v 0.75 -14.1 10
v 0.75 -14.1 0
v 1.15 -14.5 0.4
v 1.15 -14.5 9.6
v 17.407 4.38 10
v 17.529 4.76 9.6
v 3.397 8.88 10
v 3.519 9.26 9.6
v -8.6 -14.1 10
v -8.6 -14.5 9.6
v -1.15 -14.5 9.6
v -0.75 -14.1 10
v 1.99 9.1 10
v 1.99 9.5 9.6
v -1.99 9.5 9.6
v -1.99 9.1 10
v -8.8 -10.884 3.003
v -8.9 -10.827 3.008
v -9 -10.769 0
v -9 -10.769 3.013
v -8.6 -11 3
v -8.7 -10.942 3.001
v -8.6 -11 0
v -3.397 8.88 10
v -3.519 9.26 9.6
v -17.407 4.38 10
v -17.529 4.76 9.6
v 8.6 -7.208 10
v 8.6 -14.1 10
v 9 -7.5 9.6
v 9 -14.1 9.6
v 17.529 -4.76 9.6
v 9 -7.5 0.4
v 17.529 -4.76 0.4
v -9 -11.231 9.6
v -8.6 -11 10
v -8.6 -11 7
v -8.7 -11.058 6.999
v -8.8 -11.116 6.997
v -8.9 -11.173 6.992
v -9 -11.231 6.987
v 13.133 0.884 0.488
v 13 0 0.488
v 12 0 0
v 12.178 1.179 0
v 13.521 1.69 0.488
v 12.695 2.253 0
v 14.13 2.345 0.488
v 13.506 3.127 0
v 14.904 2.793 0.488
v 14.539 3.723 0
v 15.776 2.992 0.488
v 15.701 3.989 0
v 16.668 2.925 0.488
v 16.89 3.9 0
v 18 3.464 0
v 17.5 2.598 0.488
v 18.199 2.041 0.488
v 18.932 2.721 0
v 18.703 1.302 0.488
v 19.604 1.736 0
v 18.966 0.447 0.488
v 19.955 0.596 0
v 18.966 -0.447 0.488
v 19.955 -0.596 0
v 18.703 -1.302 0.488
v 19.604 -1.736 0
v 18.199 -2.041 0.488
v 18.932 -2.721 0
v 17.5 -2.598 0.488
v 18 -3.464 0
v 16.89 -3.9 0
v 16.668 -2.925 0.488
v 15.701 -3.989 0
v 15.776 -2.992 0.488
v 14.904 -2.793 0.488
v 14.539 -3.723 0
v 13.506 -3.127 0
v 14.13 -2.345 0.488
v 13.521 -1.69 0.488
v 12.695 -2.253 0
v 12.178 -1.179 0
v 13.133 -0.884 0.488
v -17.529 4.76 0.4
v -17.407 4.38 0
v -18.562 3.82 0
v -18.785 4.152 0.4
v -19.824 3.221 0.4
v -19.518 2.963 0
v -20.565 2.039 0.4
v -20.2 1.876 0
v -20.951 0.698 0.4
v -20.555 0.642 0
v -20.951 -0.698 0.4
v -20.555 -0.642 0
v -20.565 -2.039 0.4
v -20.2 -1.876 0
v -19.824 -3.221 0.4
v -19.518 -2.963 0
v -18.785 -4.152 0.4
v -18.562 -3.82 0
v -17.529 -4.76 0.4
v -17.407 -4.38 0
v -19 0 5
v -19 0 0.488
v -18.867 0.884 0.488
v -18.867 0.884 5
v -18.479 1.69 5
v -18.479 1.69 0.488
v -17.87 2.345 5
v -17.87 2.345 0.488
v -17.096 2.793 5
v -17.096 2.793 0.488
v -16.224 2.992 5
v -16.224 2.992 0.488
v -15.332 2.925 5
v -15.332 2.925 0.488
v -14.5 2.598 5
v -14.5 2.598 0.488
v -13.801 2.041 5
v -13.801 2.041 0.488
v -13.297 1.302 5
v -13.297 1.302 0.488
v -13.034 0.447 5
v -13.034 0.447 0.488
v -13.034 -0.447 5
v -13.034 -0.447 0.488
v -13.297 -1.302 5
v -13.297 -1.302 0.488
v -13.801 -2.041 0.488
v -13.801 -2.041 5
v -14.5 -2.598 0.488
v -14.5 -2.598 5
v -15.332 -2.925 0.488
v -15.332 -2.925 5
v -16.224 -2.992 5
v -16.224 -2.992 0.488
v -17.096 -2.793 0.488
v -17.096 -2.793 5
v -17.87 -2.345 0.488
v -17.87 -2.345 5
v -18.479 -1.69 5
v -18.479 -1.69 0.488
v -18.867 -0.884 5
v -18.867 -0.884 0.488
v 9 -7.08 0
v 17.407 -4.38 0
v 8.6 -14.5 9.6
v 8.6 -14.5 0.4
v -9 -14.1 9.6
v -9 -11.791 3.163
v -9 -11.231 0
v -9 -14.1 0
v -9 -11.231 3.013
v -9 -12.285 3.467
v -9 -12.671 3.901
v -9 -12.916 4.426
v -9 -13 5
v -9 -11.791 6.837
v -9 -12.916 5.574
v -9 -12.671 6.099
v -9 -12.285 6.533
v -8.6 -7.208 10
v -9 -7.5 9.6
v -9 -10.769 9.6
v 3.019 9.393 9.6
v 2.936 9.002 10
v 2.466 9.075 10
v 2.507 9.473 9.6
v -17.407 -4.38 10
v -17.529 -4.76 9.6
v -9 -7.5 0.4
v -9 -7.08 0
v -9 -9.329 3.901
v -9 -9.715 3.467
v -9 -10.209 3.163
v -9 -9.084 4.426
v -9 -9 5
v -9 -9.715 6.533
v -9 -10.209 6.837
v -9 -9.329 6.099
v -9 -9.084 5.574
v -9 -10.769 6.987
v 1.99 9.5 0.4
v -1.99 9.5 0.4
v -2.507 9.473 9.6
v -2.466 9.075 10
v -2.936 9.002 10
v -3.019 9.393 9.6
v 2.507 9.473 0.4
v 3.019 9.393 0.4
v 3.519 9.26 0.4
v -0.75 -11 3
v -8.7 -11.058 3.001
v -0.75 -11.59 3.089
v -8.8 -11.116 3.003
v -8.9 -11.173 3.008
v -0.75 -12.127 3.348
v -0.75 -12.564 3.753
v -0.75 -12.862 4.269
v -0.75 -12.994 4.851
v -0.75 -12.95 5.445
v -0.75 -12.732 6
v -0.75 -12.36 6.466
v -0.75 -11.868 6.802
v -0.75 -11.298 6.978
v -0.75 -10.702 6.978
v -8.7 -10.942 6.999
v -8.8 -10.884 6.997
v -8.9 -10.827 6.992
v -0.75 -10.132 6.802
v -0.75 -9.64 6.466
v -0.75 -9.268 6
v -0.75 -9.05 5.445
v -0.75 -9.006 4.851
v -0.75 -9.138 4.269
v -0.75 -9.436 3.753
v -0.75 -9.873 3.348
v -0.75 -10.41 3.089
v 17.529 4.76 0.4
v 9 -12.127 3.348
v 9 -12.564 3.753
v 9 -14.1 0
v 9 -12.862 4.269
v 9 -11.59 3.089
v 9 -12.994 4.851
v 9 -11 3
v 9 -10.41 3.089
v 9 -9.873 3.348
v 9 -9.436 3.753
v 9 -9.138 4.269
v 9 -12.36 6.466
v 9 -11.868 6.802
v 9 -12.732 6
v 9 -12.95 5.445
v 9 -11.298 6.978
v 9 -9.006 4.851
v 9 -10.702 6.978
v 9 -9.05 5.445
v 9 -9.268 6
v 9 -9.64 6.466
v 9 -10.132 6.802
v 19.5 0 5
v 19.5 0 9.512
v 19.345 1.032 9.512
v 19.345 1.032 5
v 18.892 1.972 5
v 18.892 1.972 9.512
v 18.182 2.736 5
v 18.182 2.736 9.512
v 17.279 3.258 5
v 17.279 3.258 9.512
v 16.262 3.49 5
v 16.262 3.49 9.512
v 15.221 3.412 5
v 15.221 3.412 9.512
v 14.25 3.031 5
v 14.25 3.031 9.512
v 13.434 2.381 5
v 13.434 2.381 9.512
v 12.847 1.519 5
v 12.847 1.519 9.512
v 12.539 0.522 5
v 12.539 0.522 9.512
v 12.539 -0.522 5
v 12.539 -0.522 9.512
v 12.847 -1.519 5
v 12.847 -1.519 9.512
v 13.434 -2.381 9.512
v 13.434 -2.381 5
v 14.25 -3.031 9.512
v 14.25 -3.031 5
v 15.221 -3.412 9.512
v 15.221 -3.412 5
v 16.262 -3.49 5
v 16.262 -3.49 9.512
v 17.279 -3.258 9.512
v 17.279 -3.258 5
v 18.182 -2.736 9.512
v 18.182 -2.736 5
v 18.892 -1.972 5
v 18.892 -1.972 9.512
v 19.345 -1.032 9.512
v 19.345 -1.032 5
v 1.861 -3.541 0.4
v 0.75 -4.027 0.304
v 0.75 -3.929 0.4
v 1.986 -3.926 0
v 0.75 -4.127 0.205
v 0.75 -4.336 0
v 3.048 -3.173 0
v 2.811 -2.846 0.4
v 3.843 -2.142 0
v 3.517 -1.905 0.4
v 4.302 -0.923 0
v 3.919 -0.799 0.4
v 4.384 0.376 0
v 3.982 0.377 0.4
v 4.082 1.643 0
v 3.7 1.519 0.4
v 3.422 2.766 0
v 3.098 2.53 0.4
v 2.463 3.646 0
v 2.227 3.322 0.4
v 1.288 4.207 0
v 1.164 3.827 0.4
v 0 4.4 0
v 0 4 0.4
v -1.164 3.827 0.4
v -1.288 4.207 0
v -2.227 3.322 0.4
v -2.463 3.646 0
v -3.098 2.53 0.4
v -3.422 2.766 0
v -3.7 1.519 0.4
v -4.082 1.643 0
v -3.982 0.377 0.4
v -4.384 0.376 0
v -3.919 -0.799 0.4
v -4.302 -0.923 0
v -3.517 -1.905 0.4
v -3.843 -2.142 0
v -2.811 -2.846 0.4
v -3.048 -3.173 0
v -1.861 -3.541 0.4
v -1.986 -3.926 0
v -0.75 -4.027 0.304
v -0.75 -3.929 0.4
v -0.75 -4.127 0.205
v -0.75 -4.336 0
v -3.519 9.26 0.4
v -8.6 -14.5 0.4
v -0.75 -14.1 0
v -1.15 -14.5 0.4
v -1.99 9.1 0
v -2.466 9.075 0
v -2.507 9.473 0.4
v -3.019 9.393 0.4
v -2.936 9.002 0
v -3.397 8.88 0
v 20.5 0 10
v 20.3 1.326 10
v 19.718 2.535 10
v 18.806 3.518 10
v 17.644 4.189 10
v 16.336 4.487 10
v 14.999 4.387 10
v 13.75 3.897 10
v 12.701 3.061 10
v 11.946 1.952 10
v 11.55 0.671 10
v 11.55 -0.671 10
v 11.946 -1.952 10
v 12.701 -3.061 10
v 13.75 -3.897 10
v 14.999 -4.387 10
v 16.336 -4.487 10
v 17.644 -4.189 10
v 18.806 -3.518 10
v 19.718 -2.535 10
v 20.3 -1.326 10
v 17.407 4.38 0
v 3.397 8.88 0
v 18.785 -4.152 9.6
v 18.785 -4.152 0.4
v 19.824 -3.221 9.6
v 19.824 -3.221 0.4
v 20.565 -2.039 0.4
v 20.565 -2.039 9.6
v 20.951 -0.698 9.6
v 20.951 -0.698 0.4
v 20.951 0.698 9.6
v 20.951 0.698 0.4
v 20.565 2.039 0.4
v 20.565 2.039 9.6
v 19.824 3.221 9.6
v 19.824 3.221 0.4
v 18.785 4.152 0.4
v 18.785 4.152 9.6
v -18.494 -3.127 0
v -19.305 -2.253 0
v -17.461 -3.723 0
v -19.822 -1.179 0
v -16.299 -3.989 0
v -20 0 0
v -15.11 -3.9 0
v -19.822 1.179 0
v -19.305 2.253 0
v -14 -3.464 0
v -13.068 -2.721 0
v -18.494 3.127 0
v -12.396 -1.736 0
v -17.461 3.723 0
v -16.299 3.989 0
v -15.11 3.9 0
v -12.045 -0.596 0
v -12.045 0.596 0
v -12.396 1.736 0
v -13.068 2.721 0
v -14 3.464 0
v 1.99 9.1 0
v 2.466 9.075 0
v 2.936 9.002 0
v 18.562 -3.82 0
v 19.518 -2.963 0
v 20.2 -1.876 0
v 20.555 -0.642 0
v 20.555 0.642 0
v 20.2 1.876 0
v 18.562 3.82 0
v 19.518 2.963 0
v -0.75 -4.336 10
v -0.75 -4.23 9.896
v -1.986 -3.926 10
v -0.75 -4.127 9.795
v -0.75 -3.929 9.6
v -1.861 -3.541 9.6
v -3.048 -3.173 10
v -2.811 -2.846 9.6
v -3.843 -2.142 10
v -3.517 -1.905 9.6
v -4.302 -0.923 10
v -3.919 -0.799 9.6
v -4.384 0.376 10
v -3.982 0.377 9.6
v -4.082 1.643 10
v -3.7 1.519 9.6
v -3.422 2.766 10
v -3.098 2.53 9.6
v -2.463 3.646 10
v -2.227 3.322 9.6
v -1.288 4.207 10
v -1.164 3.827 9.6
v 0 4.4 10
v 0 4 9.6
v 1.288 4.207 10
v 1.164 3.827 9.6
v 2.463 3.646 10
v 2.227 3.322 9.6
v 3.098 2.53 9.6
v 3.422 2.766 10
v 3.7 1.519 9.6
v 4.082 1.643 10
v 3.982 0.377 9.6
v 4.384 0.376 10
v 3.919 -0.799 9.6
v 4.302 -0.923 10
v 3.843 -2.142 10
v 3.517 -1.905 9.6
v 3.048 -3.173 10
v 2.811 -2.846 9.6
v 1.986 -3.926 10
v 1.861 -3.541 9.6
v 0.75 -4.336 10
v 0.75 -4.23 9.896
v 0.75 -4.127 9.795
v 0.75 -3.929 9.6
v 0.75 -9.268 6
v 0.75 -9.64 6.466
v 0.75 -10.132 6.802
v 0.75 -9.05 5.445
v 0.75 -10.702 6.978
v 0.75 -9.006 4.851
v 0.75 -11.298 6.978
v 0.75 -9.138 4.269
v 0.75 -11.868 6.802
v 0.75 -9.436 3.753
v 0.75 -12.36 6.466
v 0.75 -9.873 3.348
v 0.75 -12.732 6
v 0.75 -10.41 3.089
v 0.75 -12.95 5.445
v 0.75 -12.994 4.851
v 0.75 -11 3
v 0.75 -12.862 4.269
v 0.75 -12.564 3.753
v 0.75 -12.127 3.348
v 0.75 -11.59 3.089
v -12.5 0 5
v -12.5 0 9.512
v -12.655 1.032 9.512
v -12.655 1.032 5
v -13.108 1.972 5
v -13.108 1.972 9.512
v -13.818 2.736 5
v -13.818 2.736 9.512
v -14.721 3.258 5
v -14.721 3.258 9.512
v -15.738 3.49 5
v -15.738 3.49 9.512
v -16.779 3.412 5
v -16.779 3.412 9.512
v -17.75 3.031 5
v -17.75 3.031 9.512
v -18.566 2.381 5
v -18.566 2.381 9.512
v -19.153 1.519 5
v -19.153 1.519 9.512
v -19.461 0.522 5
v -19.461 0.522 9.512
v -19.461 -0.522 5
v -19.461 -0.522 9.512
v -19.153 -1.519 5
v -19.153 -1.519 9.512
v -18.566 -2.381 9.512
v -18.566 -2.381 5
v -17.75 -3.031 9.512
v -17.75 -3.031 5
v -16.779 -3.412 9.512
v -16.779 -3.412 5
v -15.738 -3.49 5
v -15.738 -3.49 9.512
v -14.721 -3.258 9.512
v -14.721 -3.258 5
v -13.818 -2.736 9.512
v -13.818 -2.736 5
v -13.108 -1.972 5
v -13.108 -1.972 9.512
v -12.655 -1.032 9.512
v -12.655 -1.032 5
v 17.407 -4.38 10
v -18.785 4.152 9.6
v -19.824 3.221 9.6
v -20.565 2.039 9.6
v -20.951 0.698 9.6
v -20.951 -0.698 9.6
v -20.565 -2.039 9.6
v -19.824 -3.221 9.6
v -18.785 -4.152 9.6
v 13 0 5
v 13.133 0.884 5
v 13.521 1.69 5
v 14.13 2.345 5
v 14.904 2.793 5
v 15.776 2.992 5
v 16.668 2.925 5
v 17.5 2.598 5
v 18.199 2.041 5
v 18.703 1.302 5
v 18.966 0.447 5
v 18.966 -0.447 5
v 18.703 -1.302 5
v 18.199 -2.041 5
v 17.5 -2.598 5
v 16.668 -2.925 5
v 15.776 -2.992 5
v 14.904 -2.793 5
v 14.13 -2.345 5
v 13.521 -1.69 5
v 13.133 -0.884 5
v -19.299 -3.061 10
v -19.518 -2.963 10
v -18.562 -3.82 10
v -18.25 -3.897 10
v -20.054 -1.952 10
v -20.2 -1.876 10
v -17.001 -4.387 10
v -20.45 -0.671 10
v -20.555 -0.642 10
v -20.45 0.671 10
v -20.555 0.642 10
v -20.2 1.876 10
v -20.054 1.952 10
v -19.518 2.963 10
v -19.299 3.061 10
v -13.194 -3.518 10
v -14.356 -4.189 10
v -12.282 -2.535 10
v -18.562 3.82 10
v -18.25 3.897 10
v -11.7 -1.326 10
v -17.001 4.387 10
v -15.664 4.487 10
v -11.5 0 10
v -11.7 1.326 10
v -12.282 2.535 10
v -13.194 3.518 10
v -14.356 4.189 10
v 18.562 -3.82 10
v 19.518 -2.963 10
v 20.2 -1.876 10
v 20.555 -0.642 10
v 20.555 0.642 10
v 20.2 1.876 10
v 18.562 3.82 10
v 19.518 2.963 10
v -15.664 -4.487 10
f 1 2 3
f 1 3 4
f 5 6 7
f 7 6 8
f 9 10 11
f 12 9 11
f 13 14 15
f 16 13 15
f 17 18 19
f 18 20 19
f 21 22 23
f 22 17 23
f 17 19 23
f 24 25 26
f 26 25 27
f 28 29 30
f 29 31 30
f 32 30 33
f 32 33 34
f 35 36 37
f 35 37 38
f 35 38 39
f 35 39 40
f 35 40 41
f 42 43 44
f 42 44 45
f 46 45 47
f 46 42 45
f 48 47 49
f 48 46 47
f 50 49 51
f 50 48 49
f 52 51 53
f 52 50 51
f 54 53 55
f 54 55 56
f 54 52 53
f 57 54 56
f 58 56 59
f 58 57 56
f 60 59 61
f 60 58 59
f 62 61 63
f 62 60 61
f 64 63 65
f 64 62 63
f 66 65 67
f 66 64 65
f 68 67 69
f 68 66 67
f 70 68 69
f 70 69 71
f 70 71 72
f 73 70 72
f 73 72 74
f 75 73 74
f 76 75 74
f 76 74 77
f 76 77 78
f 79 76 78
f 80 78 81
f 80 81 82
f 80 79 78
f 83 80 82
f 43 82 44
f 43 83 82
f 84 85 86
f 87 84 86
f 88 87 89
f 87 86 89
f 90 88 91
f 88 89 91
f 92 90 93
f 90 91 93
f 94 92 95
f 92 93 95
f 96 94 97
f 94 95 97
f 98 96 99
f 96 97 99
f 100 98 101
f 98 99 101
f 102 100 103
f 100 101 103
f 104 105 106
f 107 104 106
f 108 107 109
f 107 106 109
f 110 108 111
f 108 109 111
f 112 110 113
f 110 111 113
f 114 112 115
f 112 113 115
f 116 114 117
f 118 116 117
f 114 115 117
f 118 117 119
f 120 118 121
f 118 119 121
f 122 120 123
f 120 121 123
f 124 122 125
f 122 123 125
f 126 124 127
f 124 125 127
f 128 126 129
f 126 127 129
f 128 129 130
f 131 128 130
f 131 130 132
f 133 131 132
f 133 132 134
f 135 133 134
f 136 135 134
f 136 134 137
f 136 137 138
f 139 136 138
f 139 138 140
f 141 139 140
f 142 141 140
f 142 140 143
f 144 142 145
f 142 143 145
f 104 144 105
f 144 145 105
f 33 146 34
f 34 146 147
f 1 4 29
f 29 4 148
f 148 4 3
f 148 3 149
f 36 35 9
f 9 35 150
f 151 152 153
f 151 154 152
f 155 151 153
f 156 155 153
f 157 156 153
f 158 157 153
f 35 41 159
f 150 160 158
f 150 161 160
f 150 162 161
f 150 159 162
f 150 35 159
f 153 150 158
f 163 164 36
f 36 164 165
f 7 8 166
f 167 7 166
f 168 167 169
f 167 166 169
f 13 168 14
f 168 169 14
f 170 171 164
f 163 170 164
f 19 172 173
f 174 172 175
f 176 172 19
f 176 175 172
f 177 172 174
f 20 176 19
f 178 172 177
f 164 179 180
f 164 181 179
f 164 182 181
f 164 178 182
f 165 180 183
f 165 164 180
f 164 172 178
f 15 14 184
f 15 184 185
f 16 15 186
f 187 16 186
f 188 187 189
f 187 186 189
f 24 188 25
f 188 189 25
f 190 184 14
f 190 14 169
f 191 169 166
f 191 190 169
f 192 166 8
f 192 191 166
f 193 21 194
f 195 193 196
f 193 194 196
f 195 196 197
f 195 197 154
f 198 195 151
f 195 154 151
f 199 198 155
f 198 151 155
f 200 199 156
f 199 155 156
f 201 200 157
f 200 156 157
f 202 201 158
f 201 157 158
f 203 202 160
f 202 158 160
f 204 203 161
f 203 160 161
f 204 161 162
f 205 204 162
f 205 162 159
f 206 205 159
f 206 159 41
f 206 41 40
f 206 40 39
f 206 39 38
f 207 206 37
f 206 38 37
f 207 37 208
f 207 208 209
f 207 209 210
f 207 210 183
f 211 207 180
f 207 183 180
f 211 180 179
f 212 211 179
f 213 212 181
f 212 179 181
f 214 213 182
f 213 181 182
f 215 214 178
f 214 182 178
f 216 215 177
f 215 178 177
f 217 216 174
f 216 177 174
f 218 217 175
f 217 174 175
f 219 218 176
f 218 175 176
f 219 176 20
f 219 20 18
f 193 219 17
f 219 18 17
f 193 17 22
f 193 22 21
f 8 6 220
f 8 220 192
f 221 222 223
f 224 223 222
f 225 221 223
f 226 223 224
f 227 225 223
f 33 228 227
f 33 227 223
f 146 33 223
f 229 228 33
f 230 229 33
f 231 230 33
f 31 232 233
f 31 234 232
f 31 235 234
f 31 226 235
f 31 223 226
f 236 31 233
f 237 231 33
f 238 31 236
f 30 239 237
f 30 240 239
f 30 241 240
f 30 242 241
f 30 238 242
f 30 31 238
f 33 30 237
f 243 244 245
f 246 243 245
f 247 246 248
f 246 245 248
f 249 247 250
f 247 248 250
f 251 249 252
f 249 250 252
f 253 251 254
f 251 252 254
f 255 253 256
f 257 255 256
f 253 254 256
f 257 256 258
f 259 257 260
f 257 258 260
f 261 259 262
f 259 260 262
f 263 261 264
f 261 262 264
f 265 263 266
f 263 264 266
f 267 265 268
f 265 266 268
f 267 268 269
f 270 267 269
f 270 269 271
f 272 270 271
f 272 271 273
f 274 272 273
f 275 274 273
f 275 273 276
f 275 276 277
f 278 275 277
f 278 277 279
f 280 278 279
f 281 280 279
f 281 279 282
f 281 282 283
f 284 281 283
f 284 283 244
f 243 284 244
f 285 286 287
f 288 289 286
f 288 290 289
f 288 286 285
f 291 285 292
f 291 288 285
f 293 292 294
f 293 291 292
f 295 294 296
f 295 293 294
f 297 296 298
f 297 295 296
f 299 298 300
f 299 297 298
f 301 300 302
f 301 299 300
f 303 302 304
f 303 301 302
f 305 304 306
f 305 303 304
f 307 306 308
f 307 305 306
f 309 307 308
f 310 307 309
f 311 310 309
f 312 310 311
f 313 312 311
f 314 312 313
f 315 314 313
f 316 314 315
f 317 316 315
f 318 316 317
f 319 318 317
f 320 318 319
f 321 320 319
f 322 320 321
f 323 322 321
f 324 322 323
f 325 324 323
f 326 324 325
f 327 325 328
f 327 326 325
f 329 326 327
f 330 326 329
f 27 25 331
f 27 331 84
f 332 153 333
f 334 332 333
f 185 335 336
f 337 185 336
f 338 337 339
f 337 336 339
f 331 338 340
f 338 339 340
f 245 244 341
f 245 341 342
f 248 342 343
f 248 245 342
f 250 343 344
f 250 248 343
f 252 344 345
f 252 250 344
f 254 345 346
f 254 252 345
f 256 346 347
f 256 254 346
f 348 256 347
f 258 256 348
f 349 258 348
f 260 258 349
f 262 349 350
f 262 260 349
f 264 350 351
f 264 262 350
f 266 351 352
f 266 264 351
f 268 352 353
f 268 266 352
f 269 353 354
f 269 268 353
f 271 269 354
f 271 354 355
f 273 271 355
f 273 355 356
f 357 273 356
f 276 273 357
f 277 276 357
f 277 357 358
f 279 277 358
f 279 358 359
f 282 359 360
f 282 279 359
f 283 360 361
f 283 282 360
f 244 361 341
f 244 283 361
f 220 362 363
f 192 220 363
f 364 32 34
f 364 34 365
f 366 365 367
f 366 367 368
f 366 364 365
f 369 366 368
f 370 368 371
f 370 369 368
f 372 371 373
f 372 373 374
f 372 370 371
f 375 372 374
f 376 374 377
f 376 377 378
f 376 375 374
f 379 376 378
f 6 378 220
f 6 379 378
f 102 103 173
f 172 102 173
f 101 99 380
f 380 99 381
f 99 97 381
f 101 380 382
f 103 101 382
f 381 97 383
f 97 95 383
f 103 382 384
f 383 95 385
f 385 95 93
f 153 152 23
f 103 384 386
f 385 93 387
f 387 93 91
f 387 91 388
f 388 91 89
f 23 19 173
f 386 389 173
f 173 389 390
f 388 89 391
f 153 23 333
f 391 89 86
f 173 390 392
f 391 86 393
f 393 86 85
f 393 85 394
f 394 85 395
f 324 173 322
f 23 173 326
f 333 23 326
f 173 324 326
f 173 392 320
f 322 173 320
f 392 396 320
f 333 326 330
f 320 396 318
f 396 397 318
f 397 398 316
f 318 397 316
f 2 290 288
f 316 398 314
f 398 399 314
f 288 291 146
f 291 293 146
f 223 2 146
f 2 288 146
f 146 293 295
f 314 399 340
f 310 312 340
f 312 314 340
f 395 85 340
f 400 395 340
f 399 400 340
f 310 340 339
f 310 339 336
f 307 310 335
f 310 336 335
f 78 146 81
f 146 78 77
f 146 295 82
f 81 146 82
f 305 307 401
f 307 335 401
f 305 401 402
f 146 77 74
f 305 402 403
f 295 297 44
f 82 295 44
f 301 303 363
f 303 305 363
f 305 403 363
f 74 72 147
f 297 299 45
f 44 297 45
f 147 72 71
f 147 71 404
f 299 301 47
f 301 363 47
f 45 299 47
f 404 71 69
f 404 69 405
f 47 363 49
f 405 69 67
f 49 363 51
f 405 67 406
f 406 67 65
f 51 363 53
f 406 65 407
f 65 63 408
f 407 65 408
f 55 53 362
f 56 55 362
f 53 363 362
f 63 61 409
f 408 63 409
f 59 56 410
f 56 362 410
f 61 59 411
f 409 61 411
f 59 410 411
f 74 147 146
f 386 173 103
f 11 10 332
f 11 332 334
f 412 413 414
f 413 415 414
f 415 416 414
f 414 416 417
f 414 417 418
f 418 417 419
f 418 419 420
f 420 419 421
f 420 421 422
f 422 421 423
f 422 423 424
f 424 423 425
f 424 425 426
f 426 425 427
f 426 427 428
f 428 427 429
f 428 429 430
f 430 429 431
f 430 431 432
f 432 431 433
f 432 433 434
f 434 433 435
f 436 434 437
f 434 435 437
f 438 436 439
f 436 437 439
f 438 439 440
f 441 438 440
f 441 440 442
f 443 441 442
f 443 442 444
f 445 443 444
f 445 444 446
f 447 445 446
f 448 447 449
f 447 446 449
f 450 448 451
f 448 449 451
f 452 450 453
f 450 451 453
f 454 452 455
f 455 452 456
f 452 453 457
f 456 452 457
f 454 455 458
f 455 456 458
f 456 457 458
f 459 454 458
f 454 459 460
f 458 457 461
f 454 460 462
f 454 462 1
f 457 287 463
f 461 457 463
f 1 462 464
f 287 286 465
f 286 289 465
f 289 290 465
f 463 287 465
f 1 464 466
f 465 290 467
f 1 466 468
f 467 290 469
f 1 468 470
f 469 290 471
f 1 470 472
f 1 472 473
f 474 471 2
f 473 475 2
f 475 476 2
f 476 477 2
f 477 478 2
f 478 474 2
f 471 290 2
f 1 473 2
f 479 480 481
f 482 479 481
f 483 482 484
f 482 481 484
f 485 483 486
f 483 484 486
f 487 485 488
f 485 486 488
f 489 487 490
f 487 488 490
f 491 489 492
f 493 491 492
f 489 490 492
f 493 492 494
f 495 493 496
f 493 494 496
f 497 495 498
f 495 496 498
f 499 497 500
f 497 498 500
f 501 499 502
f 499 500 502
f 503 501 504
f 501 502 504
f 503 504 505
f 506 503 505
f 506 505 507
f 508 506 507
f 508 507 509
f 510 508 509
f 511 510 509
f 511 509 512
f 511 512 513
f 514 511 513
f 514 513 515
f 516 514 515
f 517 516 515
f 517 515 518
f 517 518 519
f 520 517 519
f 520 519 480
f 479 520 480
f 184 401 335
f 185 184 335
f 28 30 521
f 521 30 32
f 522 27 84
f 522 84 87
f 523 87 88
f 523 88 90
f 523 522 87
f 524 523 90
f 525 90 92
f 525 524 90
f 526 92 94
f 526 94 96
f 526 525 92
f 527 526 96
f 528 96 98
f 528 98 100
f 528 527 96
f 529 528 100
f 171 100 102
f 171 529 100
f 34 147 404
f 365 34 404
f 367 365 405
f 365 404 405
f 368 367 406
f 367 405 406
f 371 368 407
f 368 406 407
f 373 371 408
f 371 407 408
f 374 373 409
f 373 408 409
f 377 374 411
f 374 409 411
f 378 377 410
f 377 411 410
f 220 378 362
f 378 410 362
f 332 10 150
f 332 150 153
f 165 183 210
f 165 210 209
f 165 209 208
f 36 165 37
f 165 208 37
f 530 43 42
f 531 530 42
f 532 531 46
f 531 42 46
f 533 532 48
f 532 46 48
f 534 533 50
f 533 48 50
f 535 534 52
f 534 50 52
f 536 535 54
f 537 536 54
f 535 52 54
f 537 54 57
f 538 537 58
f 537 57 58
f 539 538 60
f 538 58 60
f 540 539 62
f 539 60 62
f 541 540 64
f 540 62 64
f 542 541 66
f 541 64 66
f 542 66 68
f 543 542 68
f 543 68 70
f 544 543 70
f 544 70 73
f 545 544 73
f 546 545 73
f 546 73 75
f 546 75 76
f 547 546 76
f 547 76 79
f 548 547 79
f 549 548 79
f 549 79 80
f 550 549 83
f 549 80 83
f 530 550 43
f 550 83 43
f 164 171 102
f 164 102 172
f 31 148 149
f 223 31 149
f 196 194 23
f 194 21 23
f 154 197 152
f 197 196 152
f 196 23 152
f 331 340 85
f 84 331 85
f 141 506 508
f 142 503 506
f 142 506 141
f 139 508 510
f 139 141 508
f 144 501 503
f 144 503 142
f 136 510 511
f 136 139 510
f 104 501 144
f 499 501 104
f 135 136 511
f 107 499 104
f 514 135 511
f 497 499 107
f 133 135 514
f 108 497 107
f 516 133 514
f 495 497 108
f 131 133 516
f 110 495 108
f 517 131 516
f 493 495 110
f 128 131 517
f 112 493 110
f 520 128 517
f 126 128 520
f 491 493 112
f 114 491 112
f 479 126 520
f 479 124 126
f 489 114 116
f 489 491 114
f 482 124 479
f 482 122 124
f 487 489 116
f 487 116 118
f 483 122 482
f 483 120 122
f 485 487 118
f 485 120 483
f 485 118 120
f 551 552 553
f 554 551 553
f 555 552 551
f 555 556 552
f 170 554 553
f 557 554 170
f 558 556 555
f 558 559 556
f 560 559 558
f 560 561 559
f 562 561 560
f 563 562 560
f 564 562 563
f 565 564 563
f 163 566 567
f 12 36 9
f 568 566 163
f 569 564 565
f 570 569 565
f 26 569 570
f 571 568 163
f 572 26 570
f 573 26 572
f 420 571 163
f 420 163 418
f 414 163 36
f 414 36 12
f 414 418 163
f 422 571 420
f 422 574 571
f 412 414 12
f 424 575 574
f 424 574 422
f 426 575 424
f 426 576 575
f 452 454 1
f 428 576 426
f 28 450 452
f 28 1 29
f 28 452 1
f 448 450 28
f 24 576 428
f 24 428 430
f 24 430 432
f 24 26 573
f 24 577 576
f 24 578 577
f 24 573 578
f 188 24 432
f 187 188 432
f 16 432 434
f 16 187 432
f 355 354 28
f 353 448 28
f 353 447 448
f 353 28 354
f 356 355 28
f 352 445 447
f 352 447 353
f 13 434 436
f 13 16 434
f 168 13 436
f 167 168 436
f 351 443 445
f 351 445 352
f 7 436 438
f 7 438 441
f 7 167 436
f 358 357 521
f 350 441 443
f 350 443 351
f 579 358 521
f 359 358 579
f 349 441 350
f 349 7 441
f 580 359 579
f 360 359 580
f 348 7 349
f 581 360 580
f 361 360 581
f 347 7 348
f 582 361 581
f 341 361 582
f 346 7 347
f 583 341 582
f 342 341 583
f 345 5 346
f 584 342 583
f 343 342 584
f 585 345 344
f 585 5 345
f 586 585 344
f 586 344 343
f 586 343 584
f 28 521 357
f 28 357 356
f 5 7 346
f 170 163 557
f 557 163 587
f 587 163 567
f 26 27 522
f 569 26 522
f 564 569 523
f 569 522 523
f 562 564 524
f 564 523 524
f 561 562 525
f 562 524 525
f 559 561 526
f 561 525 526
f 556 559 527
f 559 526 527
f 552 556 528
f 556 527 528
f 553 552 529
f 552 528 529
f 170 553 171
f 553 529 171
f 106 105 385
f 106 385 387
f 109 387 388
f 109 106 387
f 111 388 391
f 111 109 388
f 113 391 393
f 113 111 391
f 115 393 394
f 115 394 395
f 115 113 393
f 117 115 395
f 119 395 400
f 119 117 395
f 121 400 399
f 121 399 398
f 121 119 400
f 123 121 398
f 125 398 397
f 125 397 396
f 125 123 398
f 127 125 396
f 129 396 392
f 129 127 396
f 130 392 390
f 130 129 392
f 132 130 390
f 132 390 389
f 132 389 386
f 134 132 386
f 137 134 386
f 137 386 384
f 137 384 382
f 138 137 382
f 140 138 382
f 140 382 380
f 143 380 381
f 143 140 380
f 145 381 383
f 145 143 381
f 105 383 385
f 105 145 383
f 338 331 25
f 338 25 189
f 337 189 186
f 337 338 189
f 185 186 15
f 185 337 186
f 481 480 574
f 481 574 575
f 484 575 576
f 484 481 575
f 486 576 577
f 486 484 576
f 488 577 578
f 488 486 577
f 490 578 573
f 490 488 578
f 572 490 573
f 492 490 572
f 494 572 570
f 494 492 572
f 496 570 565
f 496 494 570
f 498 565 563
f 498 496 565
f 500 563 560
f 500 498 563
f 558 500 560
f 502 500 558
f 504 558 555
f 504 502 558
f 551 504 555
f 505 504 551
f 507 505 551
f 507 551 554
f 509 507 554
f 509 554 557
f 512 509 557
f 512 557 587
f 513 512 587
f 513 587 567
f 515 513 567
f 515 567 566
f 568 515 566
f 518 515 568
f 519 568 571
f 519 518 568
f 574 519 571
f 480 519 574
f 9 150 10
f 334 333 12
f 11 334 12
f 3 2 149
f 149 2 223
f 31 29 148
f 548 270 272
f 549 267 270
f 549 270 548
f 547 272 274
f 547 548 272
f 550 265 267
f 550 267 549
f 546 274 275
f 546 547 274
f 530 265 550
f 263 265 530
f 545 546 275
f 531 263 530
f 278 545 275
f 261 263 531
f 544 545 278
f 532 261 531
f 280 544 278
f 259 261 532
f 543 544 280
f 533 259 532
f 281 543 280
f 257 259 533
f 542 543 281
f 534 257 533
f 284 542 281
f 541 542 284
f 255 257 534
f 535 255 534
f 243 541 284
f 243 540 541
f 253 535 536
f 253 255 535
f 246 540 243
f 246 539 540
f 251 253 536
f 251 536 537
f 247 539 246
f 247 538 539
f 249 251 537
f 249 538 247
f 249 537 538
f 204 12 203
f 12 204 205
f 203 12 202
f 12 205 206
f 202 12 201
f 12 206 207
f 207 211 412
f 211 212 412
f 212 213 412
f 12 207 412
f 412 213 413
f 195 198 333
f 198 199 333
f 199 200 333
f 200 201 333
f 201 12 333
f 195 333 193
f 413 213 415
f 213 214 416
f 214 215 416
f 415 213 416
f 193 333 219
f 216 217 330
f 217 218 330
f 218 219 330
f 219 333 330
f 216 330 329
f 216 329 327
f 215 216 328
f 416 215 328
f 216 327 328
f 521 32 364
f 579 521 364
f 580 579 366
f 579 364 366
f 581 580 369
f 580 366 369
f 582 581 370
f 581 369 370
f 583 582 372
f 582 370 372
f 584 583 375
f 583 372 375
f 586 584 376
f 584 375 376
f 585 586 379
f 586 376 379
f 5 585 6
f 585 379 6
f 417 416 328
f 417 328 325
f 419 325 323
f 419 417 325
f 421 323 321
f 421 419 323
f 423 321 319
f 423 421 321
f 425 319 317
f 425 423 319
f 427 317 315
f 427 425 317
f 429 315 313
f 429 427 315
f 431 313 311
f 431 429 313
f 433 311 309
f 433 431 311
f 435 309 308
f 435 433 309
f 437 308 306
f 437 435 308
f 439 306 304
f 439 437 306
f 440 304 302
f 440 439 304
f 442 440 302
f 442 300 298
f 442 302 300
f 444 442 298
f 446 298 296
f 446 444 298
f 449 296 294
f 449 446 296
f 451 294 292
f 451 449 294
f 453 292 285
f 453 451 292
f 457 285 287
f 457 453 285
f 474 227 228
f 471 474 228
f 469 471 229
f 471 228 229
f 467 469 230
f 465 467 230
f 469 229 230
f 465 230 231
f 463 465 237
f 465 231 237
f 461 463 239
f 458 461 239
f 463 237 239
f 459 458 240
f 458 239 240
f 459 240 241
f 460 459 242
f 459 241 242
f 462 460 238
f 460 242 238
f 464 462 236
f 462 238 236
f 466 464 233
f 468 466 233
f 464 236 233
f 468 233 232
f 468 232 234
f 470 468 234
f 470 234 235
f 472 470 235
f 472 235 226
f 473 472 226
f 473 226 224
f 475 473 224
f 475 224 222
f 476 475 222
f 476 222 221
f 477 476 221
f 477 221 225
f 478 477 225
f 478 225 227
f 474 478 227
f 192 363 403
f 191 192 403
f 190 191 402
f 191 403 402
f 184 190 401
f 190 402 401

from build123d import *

# Parameters (mm, degrees)
BOSS_EXTRUDE1_DEPTH             = 10
CUT_EXTRUDE1_DEPTH              = 28.408940147
CUT_EXTRUDE2_DEPTH              = 28.408940147
SKETCH4_W                       = 4
SKETCH4_H                       = 10
SKETCH5_W                       = 2
SKETCH5_H                       = 20.25
F_4_0_4_DIAMETER_HOLE2_D        = 4
F_4_0_4_DIAMETER_HOLE2_DEPTH    = 20.25
M7X1_0_TAPPED_HOLE1_D           = 6
M7X1_0_TAPPED_HOLE1_CBORE_D     = 7
M7X1_0_TAPPED_HOLE1_CBORE_DEPTH = 5
FILLET1_R                       = 5
CHAMFER1_SIZE                   = 1
CHAMFER1_SIZE2                  = 0.487732589
CHAMFER2_SIZE                   = 0.4
CHAMFER3_SIZE                   = 1
CHAMFER3_SIZE2                  = 0.487732589


with BuildPart() as part:
    # Sketch1 → Boss-Extrude1 (new body)
    with BuildSketch(Plane.XY.offset(10)):
        with BuildLine():
            Line((-9, -7.5), (-9, -14.5))
            Line((-9, -14.5), (9, -14.5))
            Line((9, -14.5), (9, -7.5))
            Line((9, -7.5), (17.529062862, -4.760458672))
            ThreePointArc((17.529062862, -4.760458672), (21, 0), (17.529062862, 4.760458672))
            Line((17.529062862, 4.760458672), (2.773364341, 9.5))
            Line((2.773364341, 9.5), (-2.773364341, 9.5))
            Line((-2.773364341, 9.5), (-17.529062862, 4.760458672))
            ThreePointArc((-17.529062862, 4.760458672), (-21, 0), (-17.529062862, -4.760458672))
            Line((-17.529062862, -4.760458672), (-9, -7.5))
        make_face()
    extrude(amount=-BOSS_EXTRUDE1_DEPTH)

    # Sketch2 → Cut-Extrude1 (cut, through all)
    with BuildSketch(Plane(origin=(0, 0, 0), x_dir=(-1, 0, 0), z_dir=(0, 0, -1))):
        Polygon((9, -11.230940108), (9, -10.769059892), (8.6, -11), align=None)
    extrude(amount=-CUT_EXTRUDE1_DEPTH, mode=Mode.SUBTRACT)

    # Sketch3 → Cut-Extrude2 (cut, through all)
    with BuildSketch(Plane(origin=(0, 0, 0), x_dir=(-1, 0, 0), z_dir=(0, 0, -1))):
        with BuildLine():
            Line((0.75, -14.5), (0.75, -3.929058411))
            ThreePointArc((0.75, -3.929058411), (0, -4), (-0.75, -3.929058411))
            Line((-0.75, -3.929058411), (-0.75, -14.5))
            Line((-0.75, -14.5), (0.75, -14.5))
        make_face()
    extrude(amount=-CUT_EXTRUDE2_DEPTH, mode=Mode.SUBTRACT)

    # Sketch4 → Cut-Revolve1 (revolve, cut)
    with BuildSketch(Plane.XZ):
        with Locations((2, 5)):
            Rectangle(SKETCH4_W, SKETCH4_H)
    revolve(axis=Axis((0, 0, 10), (0, 0, -1)), mode=Mode.SUBTRACT)

    # Sketch5 → Ø4.0 (4) Diameter Hole1 (revolve, cut)
    with BuildSketch(Plane(origin=(-0.75, -11, 5), x_dir=(0, 0, -1), z_dir=(0, 1, 0))):
        with Locations((1, 10.125)):
            Rectangle(SKETCH5_W, SKETCH5_H)
    revolve(axis=Axis((5.6, -11, 5), (-1, 0, 0)), mode=Mode.SUBTRACT)

    # Ø4.0 (4) Diameter Hole2
    with Locations(Plane.ZY.offset(-0.75)):
        with Locations((5, -11)):
            Hole(F_4_0_4_DIAMETER_HOLE2_D / 2, depth=F_4_0_4_DIAMETER_HOLE2_DEPTH)

    # M7x1.0 Tapped Hole1 (through all)
    with Locations(Plane.XY.offset(10)):
        with Locations((-16, 0), (16, 0)):
            CounterBoreHole(M7X1_0_TAPPED_HOLE1_D / 2, M7X1_0_TAPPED_HOLE1_CBORE_D / 2, M7X1_0_TAPPED_HOLE1_CBORE_DEPTH)

    # Fillet1
    fillet1_edges = [part.edges().sort_by_distance(p)[0] for p in [
        (-2.773364341, 9.5, 5),
        (2.773364341, 9.5, 5),
    ]]
    fillet(fillet1_edges, radius=FILLET1_R)

    # Chamfer1
    chamfer1_edges = [part.edges().sort_by_distance(p)[0] for p in [
        (12.5, 0, 10),
        (-19.5, 0, 10),
    ]]
    chamfer1_side = [part.faces().sort_by_distance(p)[0] for p in [
        (0, 9.016264535, 10),
    ]]
    chamfer(chamfer1_edges, length=CHAMFER1_SIZE, length2=CHAMFER1_SIZE2, reference=chamfer1_side[0])

    # Chamfer2
    chamfer2_edges = [part.edges().sort_by_distance(p)[0] for p in [
        (13.264531431, -6.130229336, 0),
        (21, 0, 0),
        (10.524097746, 7.010458672, 0),
        (2.763925905, 9.439751682, 0),
        (0, 9.5, 0),
        (-2.763925905, 9.439751682, 0),
        (-10.524097746, 7.010458672, 0),
        (-13.264531431, -6.130229336, 0),
        (-21, 0, 0),
        (-9, -9.134529946, 10),
        (-13.264531431, -6.130229336, 10),
        (-21, 0, 10),
        (-10.524097746, 7.010458672, 10),
        (-2.763925905, 9.439751682, 10),
        (0, 9.5, 10),
        (2.763925905, 9.439751682, 10),
        (10.524097746, 7.010458672, 10),
        (21, 0, 10),
        (13.264531431, -6.130229336, 10),
        (9, -11, 10),
        (4.875, -14.5, 10),
        (9, -14.5, 5),
        (0.75, -14.5, 5),
        (4.875, -14.5, 0),
        (0, 4, 10),
        (-9, -12.865470054, 10),
        (-9, -14.5, 5),
        (-4.875, -14.5, 0),
        (-0.75, -14.5, 5),
        (-4.875, -14.5, 10),
        (0, 4, 0),
    ]]
    chamfer(chamfer2_edges, length=CHAMFER2_SIZE - 0.0001)  # a hair under: the kernel refuses the full size

    # Chamfer3
    chamfer3_edges = [part.edges().sort_by_distance(p)[0] for p in [
        (19, 0, 0),
        (-13, 0, 0),
    ]]
    chamfer3_side = [part.faces().sort_by_distance(p)[0] for p in [
        (4.875, -13.627267497, 0),
    ]]
    chamfer(chamfer3_edges, length=CHAMFER3_SIZE, length2=CHAMFER3_SIZE2, reference=chamfer3_side[0])


solid = part.part
